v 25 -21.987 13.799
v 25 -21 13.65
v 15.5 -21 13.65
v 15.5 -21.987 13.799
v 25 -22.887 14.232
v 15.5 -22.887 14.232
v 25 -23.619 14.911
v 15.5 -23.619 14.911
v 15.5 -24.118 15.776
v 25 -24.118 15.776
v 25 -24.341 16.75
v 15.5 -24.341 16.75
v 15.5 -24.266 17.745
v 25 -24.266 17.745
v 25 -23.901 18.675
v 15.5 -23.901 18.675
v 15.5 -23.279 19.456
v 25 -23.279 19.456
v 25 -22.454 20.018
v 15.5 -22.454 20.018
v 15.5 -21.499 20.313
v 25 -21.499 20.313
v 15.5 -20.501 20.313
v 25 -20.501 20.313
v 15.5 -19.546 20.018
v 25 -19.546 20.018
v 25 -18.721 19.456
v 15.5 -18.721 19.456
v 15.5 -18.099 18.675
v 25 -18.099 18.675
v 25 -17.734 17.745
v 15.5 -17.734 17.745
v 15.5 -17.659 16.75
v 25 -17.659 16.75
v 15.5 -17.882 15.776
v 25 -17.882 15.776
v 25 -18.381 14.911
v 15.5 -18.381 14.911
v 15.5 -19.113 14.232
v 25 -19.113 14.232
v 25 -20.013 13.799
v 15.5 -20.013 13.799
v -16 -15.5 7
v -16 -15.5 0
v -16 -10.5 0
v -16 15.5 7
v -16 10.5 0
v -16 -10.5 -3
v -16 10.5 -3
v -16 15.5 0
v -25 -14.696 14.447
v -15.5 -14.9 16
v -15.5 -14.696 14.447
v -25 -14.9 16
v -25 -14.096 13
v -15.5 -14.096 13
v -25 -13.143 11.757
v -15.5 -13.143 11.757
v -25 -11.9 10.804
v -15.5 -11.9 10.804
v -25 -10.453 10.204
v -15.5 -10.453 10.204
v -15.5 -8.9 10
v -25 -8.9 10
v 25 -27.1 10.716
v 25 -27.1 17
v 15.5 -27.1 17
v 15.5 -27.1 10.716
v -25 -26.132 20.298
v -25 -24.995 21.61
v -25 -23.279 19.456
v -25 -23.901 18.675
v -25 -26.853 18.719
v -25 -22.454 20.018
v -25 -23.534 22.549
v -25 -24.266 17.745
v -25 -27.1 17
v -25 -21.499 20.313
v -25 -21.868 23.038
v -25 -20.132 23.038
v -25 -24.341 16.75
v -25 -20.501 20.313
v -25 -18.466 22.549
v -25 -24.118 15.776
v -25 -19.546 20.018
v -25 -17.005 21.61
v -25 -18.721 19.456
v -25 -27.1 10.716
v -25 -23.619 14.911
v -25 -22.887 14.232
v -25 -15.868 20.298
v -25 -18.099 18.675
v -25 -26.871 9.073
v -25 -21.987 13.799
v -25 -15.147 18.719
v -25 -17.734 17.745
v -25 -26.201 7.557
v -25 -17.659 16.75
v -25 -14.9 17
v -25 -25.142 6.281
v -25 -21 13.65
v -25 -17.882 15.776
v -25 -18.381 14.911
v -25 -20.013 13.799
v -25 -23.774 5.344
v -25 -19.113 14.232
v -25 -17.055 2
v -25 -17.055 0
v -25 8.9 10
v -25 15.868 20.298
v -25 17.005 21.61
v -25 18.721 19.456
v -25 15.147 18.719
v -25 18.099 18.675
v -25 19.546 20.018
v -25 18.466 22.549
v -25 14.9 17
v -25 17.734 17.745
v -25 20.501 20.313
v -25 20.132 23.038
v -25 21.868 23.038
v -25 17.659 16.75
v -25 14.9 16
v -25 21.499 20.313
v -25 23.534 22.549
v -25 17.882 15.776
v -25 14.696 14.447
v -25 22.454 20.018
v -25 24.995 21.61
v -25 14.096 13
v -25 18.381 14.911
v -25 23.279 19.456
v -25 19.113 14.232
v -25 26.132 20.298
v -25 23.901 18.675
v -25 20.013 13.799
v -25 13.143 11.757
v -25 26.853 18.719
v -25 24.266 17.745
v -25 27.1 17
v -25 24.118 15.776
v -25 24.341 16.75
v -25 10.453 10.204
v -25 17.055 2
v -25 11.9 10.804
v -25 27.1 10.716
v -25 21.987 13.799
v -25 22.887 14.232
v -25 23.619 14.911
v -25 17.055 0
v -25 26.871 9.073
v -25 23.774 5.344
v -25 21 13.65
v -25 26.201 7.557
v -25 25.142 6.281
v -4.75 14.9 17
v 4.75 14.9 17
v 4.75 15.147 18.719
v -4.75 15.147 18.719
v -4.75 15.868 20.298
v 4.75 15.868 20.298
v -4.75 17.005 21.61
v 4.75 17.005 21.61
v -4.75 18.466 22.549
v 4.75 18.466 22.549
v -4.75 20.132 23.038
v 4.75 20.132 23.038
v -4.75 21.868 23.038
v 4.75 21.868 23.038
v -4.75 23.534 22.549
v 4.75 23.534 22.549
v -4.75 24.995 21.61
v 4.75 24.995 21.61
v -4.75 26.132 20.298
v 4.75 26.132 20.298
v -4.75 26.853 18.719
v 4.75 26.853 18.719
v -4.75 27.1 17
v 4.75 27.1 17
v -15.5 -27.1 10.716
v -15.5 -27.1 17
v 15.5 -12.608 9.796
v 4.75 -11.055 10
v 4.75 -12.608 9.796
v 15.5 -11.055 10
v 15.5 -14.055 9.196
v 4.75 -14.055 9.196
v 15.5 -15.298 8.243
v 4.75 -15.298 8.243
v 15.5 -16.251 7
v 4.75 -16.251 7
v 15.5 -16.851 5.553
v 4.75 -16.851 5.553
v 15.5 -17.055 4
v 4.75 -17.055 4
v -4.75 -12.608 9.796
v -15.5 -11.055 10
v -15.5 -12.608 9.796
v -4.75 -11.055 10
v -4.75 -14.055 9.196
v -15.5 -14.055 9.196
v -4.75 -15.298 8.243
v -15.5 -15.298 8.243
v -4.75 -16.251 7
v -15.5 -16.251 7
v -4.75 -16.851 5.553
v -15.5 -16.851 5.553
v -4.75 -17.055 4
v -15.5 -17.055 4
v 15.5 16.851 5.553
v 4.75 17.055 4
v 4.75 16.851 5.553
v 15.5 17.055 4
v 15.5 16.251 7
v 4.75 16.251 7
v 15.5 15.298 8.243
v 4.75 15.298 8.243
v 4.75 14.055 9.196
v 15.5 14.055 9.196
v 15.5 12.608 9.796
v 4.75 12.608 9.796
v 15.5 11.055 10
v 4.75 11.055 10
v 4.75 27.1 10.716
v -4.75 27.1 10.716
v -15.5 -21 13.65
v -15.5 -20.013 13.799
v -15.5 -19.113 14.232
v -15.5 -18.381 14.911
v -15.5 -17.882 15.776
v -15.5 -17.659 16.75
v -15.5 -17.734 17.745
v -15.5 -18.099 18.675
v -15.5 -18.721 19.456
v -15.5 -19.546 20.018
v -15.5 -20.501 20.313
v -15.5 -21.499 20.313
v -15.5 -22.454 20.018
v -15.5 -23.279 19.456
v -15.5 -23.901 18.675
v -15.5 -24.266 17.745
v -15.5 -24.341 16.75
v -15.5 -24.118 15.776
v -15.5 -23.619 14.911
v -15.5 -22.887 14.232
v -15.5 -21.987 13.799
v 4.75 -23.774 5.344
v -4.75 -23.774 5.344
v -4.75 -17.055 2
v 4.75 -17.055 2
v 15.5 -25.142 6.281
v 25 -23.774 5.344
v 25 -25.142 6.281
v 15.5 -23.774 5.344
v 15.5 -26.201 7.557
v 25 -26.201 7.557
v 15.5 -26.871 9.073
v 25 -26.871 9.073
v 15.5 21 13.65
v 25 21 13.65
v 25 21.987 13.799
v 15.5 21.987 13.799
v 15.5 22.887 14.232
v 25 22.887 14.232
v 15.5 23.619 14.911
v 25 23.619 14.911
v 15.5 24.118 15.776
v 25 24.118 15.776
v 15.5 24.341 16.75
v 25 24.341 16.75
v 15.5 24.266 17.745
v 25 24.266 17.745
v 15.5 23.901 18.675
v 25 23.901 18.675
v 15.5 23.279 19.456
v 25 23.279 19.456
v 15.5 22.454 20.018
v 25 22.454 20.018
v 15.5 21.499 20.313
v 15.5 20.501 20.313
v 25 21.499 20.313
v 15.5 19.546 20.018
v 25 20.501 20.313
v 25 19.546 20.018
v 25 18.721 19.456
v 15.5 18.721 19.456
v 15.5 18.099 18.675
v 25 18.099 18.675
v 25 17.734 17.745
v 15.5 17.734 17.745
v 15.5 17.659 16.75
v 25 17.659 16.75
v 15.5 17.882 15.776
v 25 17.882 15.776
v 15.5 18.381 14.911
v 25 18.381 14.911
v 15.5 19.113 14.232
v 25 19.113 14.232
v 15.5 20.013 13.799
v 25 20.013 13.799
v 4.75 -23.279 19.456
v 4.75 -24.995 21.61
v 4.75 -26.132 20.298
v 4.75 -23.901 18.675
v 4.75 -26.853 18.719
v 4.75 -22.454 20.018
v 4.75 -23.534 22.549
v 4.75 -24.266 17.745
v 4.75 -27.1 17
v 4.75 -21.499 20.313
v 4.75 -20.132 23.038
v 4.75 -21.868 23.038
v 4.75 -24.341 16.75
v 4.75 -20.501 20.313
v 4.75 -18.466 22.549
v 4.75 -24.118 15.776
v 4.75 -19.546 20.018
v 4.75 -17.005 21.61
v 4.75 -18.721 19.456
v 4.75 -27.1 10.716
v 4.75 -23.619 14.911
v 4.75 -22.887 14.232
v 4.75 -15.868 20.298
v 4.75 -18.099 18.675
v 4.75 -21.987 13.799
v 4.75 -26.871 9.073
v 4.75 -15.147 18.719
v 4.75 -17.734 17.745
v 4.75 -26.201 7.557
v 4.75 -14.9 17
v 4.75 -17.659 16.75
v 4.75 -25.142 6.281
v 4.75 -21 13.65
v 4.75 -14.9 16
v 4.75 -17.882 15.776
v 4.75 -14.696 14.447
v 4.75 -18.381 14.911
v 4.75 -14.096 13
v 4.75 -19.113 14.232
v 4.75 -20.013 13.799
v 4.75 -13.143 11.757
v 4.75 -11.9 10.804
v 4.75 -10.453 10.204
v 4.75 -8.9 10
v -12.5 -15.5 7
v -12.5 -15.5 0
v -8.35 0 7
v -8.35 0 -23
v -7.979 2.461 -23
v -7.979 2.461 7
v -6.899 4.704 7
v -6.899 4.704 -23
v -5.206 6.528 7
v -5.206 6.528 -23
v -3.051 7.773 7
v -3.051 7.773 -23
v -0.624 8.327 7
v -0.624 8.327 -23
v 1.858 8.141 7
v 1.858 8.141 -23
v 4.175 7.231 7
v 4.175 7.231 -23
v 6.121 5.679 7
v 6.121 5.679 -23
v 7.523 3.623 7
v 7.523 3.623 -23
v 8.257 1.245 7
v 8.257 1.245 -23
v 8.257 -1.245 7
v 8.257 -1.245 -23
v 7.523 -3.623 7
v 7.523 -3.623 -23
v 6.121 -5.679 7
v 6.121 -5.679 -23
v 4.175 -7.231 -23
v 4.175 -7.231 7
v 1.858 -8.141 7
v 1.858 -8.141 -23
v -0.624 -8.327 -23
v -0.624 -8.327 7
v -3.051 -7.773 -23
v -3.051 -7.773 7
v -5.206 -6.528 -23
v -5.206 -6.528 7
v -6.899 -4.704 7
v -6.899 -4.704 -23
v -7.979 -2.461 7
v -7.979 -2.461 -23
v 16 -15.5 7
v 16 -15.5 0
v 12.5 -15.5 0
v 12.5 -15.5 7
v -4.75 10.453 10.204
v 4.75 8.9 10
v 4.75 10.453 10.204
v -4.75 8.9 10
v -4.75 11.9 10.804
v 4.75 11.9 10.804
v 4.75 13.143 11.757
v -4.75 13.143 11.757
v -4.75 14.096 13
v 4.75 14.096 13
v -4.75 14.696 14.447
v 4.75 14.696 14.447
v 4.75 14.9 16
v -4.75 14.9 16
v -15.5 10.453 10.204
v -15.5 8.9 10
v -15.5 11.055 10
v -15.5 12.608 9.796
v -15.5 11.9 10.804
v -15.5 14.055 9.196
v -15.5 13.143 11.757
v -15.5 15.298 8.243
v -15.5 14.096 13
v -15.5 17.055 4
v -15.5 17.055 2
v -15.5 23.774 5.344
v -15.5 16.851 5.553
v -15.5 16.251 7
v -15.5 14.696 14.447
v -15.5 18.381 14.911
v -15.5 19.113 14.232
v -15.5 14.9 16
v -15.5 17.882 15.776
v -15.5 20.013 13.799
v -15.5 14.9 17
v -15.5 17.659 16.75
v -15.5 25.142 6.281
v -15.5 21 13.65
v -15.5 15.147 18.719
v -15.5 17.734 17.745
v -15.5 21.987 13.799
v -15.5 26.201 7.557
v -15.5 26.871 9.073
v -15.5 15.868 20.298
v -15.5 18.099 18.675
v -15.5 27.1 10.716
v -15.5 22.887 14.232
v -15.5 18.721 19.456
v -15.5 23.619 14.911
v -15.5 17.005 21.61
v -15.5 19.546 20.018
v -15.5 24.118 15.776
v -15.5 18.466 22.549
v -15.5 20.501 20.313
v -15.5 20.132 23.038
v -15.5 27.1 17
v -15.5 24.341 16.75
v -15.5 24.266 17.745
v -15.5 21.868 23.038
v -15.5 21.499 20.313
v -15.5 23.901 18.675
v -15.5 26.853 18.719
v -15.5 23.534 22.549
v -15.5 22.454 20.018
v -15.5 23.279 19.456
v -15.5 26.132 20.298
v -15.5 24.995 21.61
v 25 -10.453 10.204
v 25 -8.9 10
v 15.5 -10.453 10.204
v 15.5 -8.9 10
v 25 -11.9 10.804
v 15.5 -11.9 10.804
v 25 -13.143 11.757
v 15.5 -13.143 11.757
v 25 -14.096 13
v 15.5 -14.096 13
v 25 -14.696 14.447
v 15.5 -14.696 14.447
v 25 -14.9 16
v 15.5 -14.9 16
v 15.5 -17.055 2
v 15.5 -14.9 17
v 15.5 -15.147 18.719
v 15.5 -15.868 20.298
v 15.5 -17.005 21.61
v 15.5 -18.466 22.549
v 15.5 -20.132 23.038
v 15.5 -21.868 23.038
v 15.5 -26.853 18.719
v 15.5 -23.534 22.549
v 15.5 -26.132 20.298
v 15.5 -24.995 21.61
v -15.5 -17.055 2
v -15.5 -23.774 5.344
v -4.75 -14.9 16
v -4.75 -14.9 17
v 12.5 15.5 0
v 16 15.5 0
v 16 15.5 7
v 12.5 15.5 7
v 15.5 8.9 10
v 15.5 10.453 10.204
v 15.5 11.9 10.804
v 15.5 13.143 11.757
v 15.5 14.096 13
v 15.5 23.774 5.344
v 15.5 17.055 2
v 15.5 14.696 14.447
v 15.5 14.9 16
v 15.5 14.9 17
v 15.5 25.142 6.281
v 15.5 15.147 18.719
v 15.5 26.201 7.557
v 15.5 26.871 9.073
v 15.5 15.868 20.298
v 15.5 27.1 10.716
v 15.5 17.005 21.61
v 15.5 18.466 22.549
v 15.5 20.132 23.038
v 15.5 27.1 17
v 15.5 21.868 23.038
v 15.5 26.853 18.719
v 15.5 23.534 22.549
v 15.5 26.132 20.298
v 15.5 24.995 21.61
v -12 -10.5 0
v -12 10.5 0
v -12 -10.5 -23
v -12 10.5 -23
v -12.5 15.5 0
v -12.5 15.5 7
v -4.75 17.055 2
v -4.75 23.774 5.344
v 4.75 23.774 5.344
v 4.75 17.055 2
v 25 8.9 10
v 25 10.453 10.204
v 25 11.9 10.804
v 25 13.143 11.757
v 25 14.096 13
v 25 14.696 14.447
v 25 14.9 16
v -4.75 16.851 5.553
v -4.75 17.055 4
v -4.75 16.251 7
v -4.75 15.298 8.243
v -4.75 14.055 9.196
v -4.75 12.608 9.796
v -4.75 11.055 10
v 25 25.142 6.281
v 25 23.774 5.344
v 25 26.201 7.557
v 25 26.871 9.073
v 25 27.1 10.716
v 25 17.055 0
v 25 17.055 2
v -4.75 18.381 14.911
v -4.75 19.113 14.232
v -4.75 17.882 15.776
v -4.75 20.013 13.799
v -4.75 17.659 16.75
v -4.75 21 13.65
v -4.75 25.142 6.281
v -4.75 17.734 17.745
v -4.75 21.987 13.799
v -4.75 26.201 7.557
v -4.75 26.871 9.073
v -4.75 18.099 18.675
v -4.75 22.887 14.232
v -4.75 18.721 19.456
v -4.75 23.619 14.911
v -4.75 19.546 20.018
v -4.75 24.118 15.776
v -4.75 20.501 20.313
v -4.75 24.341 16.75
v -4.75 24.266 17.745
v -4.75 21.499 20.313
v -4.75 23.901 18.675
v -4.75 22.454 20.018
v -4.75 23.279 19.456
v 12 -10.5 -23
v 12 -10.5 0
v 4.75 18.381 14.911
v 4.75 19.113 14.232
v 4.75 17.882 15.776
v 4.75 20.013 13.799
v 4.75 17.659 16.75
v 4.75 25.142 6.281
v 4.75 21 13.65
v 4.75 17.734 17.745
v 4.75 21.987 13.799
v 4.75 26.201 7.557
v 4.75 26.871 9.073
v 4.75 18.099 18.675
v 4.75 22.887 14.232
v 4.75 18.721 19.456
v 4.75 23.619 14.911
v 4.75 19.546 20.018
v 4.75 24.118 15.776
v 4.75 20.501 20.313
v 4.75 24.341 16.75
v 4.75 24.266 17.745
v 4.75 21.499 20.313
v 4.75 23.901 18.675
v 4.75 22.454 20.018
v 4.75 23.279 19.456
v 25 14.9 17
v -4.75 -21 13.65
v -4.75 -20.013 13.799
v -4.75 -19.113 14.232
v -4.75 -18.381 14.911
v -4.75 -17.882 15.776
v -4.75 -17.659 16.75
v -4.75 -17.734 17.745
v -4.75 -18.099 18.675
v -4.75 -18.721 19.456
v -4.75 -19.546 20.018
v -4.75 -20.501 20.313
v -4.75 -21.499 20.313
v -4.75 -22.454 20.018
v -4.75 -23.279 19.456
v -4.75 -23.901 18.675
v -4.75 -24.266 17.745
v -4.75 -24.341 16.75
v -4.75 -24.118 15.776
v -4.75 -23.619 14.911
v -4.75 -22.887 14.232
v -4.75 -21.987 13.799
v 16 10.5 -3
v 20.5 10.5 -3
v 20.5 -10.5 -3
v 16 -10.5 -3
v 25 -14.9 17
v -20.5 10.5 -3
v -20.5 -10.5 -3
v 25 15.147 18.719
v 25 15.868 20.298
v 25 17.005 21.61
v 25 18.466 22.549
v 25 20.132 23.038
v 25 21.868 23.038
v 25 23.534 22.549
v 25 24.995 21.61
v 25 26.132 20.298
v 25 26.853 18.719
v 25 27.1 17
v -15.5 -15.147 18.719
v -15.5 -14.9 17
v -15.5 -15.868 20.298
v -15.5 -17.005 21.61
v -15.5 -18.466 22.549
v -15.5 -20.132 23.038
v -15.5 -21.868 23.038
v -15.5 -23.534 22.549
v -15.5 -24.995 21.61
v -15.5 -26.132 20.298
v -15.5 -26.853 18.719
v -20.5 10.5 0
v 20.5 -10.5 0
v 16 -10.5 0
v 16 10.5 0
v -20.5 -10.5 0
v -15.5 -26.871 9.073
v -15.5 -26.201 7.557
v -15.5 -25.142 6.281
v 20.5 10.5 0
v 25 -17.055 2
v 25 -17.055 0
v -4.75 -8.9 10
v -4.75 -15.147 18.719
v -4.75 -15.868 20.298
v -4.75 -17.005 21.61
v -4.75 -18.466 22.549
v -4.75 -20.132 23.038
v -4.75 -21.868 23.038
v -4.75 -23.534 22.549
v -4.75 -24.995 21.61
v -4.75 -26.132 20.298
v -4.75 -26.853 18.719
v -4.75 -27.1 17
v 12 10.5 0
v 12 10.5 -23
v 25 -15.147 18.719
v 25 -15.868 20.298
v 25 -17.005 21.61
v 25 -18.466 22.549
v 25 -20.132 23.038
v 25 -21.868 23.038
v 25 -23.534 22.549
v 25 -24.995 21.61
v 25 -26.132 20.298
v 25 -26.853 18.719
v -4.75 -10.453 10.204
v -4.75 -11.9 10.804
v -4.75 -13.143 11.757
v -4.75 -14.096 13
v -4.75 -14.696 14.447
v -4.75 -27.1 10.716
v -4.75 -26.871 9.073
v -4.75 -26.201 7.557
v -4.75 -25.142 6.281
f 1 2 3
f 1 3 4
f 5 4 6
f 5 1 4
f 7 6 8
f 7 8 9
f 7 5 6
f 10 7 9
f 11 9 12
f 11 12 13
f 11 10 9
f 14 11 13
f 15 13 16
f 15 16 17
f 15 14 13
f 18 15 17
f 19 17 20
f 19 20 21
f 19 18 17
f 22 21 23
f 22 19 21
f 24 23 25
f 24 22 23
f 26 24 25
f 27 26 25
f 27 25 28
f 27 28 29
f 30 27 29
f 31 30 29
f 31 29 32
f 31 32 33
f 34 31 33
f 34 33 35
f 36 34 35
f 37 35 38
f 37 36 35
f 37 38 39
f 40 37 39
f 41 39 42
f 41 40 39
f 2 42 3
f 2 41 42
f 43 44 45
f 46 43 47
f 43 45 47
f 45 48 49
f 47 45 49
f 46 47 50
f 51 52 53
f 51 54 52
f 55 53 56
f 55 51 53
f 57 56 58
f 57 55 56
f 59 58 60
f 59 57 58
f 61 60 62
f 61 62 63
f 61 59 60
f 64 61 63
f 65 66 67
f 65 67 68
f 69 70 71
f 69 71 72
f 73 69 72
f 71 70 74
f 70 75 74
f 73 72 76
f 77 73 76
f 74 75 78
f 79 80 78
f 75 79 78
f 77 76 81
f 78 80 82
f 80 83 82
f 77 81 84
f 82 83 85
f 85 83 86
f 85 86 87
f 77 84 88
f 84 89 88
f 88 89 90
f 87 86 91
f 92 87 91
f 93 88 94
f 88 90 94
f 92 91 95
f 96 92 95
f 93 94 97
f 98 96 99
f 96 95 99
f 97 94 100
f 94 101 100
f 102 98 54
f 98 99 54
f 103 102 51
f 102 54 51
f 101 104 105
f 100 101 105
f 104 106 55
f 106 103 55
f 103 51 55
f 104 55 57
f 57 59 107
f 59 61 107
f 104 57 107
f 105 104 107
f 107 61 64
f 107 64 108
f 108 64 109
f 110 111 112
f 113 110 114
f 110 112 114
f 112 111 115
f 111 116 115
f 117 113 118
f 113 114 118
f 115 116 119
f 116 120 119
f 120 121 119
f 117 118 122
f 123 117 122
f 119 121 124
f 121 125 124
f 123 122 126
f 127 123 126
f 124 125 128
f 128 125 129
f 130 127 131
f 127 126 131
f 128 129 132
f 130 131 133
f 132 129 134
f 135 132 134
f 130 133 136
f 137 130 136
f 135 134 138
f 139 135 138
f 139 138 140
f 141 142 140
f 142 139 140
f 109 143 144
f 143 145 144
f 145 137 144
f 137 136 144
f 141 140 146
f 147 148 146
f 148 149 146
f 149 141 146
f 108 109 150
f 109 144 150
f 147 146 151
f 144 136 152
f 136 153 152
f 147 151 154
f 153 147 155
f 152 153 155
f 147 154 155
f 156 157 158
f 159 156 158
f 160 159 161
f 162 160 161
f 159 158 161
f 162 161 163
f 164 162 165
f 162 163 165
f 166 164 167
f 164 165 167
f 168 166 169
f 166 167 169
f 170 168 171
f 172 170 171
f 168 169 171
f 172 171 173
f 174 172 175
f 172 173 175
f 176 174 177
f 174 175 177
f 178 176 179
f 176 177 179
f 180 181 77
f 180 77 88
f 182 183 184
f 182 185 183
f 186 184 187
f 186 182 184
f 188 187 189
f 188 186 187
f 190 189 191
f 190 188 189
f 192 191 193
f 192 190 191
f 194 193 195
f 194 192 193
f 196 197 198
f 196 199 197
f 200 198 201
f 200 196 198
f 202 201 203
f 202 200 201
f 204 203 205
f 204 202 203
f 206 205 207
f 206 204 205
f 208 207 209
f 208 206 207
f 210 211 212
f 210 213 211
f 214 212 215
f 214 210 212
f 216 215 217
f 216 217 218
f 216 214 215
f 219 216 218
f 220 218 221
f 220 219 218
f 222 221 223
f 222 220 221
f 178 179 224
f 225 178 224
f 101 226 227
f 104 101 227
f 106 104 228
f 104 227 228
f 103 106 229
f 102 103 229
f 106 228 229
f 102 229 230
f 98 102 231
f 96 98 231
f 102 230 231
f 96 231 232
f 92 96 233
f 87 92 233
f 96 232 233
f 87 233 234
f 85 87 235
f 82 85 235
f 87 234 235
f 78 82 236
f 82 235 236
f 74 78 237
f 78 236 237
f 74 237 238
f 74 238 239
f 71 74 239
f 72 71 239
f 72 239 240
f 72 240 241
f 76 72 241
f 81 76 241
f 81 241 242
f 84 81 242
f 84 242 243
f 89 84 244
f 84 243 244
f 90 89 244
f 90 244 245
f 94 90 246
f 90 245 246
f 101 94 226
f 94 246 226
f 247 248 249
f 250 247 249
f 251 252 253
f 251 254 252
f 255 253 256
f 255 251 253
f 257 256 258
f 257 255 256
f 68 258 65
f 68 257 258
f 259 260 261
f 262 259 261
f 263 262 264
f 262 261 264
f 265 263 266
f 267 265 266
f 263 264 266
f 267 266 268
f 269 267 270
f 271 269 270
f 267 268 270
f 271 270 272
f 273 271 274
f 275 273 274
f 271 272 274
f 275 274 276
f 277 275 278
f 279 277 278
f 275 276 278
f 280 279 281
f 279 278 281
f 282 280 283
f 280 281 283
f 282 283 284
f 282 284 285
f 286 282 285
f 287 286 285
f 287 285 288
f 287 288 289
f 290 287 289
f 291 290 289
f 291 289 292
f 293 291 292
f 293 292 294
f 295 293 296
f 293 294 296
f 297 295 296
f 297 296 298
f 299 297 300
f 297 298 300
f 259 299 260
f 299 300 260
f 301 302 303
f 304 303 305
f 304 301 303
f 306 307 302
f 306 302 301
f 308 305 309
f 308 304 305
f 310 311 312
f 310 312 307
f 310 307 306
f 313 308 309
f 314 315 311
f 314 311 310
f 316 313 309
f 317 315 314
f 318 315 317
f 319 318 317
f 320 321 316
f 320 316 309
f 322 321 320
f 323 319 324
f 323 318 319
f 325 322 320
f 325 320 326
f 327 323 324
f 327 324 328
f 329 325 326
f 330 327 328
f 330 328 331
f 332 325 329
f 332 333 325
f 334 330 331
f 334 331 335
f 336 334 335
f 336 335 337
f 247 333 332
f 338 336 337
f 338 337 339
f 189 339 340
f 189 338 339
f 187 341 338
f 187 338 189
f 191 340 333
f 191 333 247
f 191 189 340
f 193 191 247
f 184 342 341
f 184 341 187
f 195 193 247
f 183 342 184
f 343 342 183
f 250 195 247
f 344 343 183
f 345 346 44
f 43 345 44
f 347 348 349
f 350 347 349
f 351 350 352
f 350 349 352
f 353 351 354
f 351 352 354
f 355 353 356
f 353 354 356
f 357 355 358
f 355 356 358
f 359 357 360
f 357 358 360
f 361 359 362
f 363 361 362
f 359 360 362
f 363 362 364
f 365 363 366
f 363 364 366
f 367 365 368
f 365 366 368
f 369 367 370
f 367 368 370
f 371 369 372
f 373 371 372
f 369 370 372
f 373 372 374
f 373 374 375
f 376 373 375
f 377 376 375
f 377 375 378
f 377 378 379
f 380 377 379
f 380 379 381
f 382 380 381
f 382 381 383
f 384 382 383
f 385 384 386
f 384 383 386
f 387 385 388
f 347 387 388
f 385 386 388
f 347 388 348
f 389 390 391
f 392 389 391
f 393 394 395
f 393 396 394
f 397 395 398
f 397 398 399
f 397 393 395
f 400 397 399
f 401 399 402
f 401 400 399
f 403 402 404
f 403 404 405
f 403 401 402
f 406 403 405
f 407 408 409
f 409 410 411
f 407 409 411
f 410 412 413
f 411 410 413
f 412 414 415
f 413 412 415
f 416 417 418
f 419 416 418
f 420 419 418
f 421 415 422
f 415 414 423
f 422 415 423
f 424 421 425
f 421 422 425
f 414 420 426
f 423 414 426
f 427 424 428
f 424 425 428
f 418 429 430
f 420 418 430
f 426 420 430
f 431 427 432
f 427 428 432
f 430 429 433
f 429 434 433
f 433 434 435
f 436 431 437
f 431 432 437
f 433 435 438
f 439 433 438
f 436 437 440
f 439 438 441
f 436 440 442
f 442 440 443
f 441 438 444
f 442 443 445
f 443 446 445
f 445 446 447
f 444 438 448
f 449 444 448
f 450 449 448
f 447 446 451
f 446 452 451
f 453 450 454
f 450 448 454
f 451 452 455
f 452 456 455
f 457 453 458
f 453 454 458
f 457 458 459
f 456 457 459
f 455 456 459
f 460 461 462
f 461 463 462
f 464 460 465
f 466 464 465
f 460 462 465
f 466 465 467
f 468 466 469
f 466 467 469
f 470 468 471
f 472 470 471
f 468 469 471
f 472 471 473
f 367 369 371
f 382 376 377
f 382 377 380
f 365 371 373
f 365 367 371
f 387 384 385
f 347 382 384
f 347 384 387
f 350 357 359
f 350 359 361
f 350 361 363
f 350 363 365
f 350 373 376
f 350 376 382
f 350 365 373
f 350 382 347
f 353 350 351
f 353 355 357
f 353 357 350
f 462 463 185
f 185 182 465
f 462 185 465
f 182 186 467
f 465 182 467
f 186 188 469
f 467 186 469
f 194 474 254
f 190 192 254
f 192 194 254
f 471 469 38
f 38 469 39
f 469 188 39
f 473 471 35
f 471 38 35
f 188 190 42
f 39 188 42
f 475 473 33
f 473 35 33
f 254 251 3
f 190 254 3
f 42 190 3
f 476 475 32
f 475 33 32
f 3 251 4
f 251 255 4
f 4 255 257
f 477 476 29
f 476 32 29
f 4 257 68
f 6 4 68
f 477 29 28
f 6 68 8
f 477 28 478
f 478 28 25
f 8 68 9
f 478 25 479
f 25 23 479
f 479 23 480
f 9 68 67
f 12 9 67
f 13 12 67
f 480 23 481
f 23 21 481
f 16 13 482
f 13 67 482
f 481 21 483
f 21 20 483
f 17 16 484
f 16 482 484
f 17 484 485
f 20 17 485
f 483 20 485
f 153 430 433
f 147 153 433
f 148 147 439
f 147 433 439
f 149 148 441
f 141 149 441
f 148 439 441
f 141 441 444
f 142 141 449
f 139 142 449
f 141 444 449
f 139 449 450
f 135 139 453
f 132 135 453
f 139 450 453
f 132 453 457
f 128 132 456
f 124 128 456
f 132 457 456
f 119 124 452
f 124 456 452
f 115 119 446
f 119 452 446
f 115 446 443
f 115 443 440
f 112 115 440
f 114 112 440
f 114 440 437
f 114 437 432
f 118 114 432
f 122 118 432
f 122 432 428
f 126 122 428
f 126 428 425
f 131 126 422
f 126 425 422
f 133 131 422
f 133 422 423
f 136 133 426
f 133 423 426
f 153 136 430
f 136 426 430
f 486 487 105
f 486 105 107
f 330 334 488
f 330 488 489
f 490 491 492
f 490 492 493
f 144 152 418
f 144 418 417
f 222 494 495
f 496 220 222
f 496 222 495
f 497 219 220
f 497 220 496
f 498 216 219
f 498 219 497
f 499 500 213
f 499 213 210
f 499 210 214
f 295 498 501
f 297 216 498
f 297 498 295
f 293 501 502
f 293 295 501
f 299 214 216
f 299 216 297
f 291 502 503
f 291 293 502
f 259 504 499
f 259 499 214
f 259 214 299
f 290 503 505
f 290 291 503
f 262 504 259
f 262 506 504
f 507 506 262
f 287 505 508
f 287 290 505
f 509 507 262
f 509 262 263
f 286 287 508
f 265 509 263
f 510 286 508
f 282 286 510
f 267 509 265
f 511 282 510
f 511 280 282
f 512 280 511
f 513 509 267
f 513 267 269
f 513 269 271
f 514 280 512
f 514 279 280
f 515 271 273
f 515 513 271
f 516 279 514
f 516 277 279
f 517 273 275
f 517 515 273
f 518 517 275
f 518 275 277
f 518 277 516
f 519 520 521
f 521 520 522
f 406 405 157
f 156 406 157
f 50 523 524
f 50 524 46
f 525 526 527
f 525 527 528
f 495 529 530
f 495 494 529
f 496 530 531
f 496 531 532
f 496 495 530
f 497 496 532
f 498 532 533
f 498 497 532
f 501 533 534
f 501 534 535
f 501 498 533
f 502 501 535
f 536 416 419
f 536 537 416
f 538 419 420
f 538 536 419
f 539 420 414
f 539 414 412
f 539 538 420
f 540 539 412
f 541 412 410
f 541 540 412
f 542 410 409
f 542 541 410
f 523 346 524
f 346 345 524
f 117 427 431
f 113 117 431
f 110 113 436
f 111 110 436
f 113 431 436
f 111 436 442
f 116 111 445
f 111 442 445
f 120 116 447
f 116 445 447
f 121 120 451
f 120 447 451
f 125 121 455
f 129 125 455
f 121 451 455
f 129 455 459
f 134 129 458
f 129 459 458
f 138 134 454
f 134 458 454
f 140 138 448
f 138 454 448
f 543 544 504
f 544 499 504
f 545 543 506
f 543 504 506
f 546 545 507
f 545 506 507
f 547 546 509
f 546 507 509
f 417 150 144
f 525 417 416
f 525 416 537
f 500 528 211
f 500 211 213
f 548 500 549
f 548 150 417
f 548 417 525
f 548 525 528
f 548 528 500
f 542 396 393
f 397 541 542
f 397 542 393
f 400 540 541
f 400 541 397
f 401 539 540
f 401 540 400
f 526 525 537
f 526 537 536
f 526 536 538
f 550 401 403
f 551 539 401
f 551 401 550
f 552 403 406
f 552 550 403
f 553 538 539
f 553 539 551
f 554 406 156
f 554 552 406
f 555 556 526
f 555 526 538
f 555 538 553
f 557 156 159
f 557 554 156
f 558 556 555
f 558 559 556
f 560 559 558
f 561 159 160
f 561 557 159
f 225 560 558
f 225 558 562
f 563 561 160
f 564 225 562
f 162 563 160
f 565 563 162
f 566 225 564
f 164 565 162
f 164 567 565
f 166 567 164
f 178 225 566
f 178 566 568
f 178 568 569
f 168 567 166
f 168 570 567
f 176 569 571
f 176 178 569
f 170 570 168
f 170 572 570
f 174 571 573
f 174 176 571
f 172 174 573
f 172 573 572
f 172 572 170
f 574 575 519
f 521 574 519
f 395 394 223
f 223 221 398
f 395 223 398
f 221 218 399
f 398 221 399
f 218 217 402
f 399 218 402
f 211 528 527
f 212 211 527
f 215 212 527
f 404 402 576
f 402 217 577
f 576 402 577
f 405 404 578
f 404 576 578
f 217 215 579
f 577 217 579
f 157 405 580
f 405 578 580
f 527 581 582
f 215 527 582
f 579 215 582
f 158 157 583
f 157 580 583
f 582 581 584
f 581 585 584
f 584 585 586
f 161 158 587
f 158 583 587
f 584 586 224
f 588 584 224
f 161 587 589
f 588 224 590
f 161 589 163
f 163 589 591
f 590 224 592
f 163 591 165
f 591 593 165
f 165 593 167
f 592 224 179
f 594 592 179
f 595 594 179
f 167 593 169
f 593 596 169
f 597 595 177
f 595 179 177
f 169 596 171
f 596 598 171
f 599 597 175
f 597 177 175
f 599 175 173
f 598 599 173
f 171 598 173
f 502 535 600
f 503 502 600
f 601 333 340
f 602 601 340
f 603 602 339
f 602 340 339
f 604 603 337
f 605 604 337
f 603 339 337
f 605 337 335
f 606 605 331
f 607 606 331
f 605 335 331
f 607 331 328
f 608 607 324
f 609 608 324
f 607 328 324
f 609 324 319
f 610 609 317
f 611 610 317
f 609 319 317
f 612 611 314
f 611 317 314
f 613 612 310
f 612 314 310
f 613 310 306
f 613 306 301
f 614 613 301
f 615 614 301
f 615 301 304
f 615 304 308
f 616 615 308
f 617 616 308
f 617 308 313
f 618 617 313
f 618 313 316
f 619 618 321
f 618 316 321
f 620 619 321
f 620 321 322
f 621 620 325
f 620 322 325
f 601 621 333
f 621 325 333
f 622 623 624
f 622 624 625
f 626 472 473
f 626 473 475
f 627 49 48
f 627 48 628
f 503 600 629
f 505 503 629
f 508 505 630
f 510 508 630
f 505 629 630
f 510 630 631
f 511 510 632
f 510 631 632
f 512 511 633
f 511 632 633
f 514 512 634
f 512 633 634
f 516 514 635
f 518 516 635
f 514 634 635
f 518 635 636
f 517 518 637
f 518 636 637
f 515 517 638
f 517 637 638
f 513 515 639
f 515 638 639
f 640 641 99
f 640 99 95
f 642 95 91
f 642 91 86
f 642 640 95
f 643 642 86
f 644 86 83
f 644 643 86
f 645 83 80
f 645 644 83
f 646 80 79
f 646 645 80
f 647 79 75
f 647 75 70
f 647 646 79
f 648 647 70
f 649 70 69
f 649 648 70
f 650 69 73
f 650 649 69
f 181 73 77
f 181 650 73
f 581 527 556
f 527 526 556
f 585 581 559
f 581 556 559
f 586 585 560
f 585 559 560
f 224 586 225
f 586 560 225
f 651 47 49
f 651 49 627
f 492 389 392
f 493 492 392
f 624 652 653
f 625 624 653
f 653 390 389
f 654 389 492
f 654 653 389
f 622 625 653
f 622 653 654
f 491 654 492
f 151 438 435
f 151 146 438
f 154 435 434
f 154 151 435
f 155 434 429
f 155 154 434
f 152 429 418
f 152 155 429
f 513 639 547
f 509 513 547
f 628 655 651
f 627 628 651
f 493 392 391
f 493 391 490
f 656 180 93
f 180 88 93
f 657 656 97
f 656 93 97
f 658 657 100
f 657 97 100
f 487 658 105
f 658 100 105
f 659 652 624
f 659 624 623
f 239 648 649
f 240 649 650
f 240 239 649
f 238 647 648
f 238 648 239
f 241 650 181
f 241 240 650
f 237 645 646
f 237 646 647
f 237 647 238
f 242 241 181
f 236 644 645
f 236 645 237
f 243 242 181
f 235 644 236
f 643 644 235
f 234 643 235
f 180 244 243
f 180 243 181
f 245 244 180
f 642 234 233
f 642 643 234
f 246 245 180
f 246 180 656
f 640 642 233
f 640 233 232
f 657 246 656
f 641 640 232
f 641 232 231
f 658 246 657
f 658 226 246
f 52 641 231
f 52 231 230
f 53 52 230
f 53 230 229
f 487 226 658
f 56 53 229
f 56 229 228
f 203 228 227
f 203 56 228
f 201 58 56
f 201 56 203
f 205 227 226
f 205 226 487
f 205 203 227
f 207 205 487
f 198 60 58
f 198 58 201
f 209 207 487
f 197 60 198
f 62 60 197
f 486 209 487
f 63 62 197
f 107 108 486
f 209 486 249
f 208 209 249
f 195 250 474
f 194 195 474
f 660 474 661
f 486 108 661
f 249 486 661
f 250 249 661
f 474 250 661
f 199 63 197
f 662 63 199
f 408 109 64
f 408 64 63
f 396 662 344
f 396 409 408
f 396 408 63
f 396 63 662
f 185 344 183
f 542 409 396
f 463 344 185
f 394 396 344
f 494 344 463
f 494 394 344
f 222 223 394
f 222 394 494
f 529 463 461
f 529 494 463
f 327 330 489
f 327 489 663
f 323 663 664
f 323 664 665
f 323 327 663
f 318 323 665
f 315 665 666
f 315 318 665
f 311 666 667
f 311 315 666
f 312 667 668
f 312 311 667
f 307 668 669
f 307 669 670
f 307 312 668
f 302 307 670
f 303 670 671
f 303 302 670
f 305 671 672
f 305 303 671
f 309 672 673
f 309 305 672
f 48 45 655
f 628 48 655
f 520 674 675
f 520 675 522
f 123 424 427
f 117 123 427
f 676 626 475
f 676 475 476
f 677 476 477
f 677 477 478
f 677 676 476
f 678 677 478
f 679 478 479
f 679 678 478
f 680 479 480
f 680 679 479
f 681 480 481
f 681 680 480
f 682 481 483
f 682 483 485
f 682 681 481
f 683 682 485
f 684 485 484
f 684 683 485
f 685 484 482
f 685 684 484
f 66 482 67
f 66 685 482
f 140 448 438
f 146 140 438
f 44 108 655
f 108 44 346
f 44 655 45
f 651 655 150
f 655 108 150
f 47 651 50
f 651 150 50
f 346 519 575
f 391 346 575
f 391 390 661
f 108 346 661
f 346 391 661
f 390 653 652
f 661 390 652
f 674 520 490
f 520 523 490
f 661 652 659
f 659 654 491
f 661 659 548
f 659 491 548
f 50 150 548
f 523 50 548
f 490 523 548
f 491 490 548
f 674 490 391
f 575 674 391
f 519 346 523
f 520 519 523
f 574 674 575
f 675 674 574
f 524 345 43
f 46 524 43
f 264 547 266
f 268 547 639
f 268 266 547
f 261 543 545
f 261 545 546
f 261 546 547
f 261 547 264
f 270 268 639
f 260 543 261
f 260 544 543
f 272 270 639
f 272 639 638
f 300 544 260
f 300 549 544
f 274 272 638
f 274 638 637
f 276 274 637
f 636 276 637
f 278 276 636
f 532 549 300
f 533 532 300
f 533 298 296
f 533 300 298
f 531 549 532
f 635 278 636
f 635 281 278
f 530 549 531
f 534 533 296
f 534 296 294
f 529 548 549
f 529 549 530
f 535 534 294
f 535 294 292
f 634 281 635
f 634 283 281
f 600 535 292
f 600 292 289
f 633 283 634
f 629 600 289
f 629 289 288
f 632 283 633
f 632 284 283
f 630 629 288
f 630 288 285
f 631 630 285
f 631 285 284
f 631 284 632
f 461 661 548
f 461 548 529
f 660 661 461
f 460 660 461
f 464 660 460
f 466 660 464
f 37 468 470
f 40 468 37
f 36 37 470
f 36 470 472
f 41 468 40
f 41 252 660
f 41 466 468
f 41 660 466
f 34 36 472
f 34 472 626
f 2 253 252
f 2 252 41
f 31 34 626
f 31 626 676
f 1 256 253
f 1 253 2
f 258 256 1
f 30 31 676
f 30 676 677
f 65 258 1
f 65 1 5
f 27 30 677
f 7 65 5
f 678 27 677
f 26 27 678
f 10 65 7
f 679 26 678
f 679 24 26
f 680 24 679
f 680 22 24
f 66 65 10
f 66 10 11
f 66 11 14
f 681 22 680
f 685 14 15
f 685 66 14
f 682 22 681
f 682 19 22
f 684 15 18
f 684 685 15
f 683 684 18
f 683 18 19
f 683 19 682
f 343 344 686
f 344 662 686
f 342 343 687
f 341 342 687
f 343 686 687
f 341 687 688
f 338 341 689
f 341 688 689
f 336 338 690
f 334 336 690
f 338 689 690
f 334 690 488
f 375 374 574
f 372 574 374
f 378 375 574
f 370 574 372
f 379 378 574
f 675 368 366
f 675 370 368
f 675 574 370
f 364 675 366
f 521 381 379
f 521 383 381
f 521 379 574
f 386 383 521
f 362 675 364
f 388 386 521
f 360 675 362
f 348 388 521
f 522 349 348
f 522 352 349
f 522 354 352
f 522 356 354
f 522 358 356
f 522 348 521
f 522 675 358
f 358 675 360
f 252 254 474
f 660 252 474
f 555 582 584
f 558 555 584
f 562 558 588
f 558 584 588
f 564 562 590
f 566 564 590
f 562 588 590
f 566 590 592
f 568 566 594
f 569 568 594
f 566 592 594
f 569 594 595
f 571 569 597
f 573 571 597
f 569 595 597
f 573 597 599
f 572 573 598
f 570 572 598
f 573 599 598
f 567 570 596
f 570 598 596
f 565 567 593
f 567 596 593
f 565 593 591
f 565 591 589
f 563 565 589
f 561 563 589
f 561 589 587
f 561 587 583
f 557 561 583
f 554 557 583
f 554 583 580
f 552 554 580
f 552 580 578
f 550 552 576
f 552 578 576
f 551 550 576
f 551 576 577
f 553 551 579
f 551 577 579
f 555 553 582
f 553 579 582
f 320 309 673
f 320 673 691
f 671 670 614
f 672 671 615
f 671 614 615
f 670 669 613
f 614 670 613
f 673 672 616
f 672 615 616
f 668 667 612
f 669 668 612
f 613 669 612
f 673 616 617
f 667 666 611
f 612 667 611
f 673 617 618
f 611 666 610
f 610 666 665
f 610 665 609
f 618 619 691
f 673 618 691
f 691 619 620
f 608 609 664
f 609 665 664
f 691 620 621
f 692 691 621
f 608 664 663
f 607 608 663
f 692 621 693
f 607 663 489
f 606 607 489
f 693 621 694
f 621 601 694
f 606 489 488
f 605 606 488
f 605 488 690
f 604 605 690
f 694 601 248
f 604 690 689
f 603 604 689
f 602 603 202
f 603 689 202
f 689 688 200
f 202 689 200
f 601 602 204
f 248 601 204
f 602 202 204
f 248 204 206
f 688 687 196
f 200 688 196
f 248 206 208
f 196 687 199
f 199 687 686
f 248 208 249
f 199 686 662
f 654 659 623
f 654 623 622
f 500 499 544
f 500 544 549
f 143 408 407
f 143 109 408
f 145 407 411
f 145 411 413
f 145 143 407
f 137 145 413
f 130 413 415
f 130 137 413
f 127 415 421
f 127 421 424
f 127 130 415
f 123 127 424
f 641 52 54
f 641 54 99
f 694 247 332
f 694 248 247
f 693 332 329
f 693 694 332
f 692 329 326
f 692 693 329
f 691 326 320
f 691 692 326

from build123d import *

# Parameters (mm, degrees)
SKETCH1_W               = 50
SKETCH1_H               = 34.11
BOSS_EXTRUDE1_DEPTH     = 10
SKETCH3_W               = 41
SKETCH3_H               = 21
BOSS_EXTRUDE2_DEPTH     = 3
SKETCH2_W               = 3.5
SKETCH2_H               = 31
CUT_EXTRUDE1_DEPTH      = 4
CUT_EXTRUDE1_DEPTH_BACK = 7
SKETCH4_W               = 25
SKETCH4_H               = 21
BOSS_EXTRUDE3_DEPTH     = 20
SKETCH5_R               = 8.35
CUT_EXTRUDE2_DEPTH      = 30
SKETCH6_R               = 3.35
BOSS_EXTRUDE4_DEPTH     = 9.5
LPATTERN1_COUNT         = 3
LPATTERN1_PITCH         = 20.25
MIRROR1_COPY_1_SKETCH_R = 3.35
MIRROR1_COPY_1_DEPTH    = 9.5
MIRROR1_COPY_2_SKETCH_R = 3.35
MIRROR1_COPY_2_DEPTH    = 9.5
FILLET1_R               = 6
SKETCH7_W               = 23
SKETCH7_H               = 21
CUT_EXTRUDE3_DEPTH      = 0.5
FILLET2_R               = 6


with BuildPart() as part:
    # Sketch1 → Boss-Extrude1 (new body)
    with BuildSketch(Plane.XY):
        Rectangle(SKETCH1_W, SKETCH1_H)
    extrude(amount=BOSS_EXTRUDE1_DEPTH)

    # Sketch3 → Boss-Extrude2 (add)
    with BuildSketch(Plane(origin=(0, 0, 0), x_dir=(-1, 0, 0), z_dir=(0, 0, -1))):
        Rectangle(SKETCH3_W, SKETCH3_H)
    extrude(amount=BOSS_EXTRUDE2_DEPTH)

    # Sketch2 → Cut-Extrude1 (cut, two sides)
    with BuildSketch(Plane(origin=(0, 0, 0), x_dir=(-1, 0, 0), z_dir=(0, 0, -1))) as cut_extrude1_sk:
        with Locations((-14.25, 0)):
            Rectangle(SKETCH2_W, SKETCH2_H)
        with Locations((14.25, 0)):
            Rectangle(SKETCH2_W, SKETCH2_H)
    extrude(amount=CUT_EXTRUDE1_DEPTH, mode=Mode.SUBTRACT)
    extrude(cut_extrude1_sk.sketch, amount=-CUT_EXTRUDE1_DEPTH_BACK, mode=Mode.SUBTRACT)

    # Sketch4 → Boss-Extrude3 (add)
    with BuildSketch(Plane(origin=(0, 0, -3), x_dir=(-1, 0, 0), z_dir=(0, 0, -1))):
        Rectangle(SKETCH4_W, SKETCH4_H)
    extrude(amount=BOSS_EXTRUDE3_DEPTH)

    # Sketch5 → Cut-Extrude2 (cut)
    with BuildSketch(Plane(origin=(0, 0, -23), x_dir=(-1, 0, 0), z_dir=(0, 0, -1))):
        Circle(SKETCH5_R)
    extrude(amount=-CUT_EXTRUDE2_DEPTH, mode=Mode.SUBTRACT)

    # Sketch6 → Boss-Extrude4 (add)
    with BuildSketch(Plane(origin=(25, 0, 0), x_dir=(0, 0, -1), z_dir=(1, 0, 0))):
        with BuildLine():
            Line((-17, 27.1), (-7, 27.1))
            Line((-7, 27.1), (-2, 17.055))
            Line((-2, 17.055), (-10, 17.055))
            Line((-10, 17.055), (-10, 14.9))
            Line((-10, 14.9), (-17, 14.9))
            ThreePointArc((-17, 14.9), (-23.1, 21), (-17, 27.1))
        make_face()
        with Locations((-17, 21)):
            Circle(SKETCH6_R, mode=Mode.SUBTRACT)
    boss_extrude4 = extrude(amount=-BOSS_EXTRUDE4_DEPTH)

    # LPattern1: Boss-Extrude4 ×3
    with Locations(*[(-i * LPATTERN1_PITCH, 0, 0) for i in range(1, LPATTERN1_COUNT)]):
        add(boss_extrude4)

    # Mirror1: Boss-Extrude4 across plane
    add(boss_extrude4.mirror(Plane.ZX))

    # Mirror1 copy 1 sketch → Mirror1 copy 1 (add)
    with BuildSketch(Plane(origin=(4.75, 0, 0), x_dir=(0, 0, -1), z_dir=(1, 0, 0))):
        with BuildLine():
            Line((-17, -27.1), (-7, -27.1))
            Line((-7, -27.1), (-2, -17.055))
            Line((-2, -17.055), (-10, -17.055))
            Line((-10, -17.055), (-10, -14.9))
            Line((-10, -14.9), (-17, -14.9))
            ThreePointArc((-17, -14.9), (-23.1, -21), (-17, -27.1))
        make_face()
        with Locations((-17, -21)):
            Circle(MIRROR1_COPY_1_SKETCH_R, mode=Mode.SUBTRACT)
    extrude(amount=-MIRROR1_COPY_1_DEPTH)

    # Mirror1 copy 2 sketch → Mirror1 copy 2 (add)
    with BuildSketch(Plane(origin=(-15.5, 0, 0), x_dir=(0, 0, -1), z_dir=(1, 0, 0))):
        with BuildLine():
            Line((-17, -27.1), (-7, -27.1))
            Line((-7, -27.1), (-2, -17.055))
            Line((-2, -17.055), (-10, -17.055))
            Line((-10, -17.055), (-10, -14.9))
            Line((-10, -14.9), (-17, -14.9))
            ThreePointArc((-17, -14.9), (-23.1, -21), (-17, -27.1))
        make_face()
        with Locations((-17, -21)):
            Circle(MIRROR1_COPY_2_SKETCH_R, mode=Mode.SUBTRACT)
    extrude(amount=-MIRROR1_COPY_2_DEPTH)

    # Fillet1
    fillet1_edges = [part.edges().sort_by_distance(p)[0] for p in [
        (20.25, 27.1, 7),
        (20.25, 14.9, 10),
        (0, 27.1, 7),
        (0, 14.9, 10),
        (-20.25, 27.1, 7),
        (-20.25, 14.9, 10),
        (20.25, -14.9, 10),
        (20.25, -27.1, 7),
        (0, -14.9, 10),
        (0, -27.1, 7),
        (-20.25, -14.9, 10),
        (-20.25, -27.1, 7),
    ]]
    fillet(fillet1_edges, radius=FILLET1_R)

    # Sketch7 → Cut-Extrude3 (cut)
    with BuildSketch(Plane(origin=(12.5, 0, 0), x_dir=(0, 0, -1), z_dir=(1, 0, 0))):
        with Locations((11.5, 0)):
            Rectangle(SKETCH7_W, SKETCH7_H)
    cut_extrude3 = extrude(amount=-CUT_EXTRUDE3_DEPTH, mode=Mode.SUBTRACT)

    # Mirror2: Cut-Extrude3 across plane
    add(cut_extrude3.mirror(Plane(origin=(0, 0, 0), x_dir=(0, 0, 1), z_dir=(1, 0, 0))), mode=Mode.SUBTRACT)

    # Fillet2
    fillet2_edges = [part.edges().sort_by_distance(p)[0] for p in [
        (10.125, 17.055, 10),
        (-10.125, 17.055, 10),
        (10.125, -17.055, 10),
        (-10.125, -17.055, 10),
    ]]
    fillet(fillet2_edges, radius=FILLET2_R)


solid = part.part
